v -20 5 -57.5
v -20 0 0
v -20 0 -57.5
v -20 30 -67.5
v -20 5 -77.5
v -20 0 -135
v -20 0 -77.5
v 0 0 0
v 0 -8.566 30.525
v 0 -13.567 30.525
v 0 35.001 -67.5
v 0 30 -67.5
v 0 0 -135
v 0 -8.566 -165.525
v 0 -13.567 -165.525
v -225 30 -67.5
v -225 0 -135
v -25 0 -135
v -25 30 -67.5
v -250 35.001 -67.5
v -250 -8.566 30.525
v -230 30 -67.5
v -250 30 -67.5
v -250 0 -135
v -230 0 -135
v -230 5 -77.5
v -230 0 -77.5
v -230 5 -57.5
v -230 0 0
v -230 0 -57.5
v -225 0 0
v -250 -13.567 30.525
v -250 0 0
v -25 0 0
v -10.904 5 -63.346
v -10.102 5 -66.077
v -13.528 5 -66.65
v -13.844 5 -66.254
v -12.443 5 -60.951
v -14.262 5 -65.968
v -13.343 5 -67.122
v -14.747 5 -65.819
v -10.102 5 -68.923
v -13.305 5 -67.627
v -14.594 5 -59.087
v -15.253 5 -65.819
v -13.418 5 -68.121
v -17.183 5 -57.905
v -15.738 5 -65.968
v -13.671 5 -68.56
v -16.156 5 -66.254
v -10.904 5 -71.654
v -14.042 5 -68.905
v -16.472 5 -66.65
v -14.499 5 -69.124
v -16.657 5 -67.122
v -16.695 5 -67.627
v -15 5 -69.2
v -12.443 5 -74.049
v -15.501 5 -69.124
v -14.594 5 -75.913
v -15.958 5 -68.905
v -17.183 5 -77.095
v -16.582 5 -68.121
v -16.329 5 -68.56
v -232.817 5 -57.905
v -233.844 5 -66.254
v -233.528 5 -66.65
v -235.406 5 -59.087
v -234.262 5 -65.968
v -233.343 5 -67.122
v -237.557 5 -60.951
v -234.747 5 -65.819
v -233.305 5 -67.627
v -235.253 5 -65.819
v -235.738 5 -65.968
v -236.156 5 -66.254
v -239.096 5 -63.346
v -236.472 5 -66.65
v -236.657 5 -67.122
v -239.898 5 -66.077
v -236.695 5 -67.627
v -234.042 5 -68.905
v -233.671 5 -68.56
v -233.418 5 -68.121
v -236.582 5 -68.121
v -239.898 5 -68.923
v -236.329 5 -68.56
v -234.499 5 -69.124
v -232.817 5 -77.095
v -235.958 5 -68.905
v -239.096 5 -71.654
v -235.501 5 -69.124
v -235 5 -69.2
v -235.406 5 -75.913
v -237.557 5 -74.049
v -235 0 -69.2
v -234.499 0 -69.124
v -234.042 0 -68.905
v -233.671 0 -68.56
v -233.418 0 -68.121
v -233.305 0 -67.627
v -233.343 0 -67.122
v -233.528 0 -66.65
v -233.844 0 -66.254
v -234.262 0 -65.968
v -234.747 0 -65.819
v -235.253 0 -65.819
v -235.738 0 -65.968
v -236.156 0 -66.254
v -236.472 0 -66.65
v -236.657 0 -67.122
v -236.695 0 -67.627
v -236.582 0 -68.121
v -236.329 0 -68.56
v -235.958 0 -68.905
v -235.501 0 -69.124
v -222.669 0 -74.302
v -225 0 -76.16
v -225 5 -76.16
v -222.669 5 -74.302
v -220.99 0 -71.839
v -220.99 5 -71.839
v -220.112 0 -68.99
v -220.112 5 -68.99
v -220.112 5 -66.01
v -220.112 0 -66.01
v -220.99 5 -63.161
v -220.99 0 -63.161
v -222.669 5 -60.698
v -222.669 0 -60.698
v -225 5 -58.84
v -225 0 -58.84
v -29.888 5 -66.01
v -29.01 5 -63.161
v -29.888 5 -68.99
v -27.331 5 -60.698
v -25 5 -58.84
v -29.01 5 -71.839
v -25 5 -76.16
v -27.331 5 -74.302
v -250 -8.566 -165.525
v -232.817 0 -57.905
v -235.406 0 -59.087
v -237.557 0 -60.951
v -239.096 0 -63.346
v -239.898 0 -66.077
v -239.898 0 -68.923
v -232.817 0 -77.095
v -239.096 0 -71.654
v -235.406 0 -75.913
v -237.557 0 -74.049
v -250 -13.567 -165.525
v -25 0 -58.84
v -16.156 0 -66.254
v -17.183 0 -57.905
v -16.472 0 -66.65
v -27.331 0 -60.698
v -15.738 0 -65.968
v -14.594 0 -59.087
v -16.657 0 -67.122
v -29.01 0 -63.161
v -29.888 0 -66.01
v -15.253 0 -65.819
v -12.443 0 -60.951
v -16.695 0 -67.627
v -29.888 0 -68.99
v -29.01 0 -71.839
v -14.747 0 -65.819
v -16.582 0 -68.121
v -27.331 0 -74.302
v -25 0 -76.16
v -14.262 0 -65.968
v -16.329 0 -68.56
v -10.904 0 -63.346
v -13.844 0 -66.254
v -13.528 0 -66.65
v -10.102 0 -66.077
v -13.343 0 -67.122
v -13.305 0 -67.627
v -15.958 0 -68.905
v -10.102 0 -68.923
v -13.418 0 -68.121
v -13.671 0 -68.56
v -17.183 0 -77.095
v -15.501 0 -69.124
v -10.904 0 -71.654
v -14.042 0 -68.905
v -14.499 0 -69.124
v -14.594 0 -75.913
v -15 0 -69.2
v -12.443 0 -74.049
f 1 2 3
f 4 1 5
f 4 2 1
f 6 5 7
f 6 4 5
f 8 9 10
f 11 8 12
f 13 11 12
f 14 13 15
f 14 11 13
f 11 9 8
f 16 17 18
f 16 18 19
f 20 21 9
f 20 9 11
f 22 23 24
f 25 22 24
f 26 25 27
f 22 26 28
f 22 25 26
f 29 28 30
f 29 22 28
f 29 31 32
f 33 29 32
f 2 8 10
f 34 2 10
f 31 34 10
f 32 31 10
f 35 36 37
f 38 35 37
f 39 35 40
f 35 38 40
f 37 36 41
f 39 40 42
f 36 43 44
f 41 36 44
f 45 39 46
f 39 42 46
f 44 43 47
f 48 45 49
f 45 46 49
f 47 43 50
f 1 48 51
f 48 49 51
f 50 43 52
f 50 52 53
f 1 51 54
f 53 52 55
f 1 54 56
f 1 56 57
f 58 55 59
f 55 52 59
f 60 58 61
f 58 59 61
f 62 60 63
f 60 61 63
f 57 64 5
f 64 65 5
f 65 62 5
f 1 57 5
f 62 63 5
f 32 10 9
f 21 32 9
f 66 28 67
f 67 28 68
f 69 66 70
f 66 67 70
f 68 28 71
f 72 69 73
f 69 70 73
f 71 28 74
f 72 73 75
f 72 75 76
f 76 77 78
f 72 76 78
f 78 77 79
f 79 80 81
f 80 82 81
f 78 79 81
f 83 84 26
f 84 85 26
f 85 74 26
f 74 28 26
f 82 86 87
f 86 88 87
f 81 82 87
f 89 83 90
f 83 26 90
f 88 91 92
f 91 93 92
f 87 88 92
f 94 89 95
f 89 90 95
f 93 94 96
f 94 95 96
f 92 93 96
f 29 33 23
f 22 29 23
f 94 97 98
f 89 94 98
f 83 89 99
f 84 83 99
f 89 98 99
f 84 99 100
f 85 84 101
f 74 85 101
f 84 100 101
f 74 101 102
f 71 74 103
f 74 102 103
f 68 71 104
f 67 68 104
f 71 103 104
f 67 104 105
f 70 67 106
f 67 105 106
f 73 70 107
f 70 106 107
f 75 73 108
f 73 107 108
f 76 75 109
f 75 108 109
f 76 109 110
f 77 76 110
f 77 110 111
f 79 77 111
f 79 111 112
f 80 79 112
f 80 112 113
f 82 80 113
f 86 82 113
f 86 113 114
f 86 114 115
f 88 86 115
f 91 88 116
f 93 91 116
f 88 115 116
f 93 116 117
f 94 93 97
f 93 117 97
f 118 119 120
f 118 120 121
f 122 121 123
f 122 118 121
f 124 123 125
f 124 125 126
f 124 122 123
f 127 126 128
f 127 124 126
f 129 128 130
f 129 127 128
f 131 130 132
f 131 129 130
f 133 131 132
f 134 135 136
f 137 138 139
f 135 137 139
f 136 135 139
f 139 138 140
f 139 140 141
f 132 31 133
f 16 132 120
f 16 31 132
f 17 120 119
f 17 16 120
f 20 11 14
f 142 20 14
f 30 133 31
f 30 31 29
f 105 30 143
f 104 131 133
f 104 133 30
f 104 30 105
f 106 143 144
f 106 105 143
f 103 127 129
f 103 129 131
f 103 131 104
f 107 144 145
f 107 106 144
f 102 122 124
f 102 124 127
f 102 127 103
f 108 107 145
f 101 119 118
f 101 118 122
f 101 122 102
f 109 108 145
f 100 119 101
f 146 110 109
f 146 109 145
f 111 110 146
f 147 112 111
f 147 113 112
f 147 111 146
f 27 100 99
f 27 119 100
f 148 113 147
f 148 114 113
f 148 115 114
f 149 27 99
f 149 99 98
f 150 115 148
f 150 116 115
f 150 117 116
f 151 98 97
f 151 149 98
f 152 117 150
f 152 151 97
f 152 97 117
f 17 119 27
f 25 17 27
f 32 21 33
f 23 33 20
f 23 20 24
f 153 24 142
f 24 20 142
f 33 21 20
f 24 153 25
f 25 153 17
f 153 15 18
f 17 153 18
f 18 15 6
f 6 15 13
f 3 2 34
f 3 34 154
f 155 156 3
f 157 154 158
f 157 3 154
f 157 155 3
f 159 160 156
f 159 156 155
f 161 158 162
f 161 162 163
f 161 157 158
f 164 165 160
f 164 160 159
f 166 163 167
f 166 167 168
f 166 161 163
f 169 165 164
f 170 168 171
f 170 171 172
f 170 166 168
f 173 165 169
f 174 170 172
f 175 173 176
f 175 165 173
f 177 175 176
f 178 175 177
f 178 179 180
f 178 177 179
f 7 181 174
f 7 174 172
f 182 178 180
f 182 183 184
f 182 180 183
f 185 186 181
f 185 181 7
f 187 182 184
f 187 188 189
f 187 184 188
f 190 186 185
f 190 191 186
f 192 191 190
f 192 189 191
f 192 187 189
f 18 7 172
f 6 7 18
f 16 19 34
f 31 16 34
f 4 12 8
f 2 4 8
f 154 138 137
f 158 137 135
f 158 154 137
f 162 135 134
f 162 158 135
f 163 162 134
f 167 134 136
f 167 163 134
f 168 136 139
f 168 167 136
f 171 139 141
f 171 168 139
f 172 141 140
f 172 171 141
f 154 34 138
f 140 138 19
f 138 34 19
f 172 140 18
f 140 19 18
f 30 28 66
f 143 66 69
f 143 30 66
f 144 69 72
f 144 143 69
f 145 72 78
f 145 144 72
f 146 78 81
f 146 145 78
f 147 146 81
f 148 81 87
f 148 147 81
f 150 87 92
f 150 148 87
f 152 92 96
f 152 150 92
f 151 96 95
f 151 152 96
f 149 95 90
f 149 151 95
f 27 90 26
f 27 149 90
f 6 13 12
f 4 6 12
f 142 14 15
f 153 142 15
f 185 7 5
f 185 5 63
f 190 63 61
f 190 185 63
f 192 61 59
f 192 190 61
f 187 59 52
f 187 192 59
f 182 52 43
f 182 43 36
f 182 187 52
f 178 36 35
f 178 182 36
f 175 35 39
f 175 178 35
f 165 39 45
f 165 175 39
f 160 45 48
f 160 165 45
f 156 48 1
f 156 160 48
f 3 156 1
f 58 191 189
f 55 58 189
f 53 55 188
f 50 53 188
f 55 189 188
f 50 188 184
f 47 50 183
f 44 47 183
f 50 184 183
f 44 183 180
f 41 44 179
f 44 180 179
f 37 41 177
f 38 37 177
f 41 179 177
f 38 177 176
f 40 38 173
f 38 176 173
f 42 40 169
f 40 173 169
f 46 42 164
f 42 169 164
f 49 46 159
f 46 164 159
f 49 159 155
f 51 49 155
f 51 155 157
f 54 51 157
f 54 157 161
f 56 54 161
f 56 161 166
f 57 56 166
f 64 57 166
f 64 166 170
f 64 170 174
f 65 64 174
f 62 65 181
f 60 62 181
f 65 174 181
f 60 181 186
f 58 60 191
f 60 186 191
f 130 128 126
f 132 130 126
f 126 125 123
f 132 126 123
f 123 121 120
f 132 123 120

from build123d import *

# Parameters (mm, degrees)
BOSS_EXTRUDE2_DEPTH = 250
BOSS_EXTRUDE3_DEPTH = 25
CUT_EXTRUDE1_DEPTH  = 20
BOSS_EXTRUDE4_DEPTH = 25
CUT_EXTRUDE2_DEPTH  = 20
SKETCH6_R           = 10
BOSS_EXTRUDE5_DEPTH = 5


with BuildPart() as part:
    # Sketch1 → Boss-Extrude2 (new body)
    with BuildSketch(Plane(origin=(0, 0, 0), x_dir=(0, 0, -1), z_dir=(1, 0, 0))):
        Polygon((-30.524745156, -13.566553403), (0, 0), (67.5, 30), (135, 0), (165.524745156, -13.566553403), (165.524745156, -8.565955709), (67.5, 35.000597694), (-30.524745156, -8.565955709), align=None)
    extrude(amount=-BOSS_EXTRUDE2_DEPTH)

    # Sketch2 → Boss-Extrude3 (add)
    with BuildSketch(Plane(origin=(0, 0, 0), x_dir=(0, 0, -1), z_dir=(1, 0, 0))):
        Polygon((0, 0), (135, 0), (67.5, 30), align=None)
    extrude(amount=-BOSS_EXTRUDE3_DEPTH)

    # Sketch3 → Cut-Extrude1 (cut)
    with BuildSketch(Plane(origin=(0, 0, 0), x_dir=(0, 0, -1), z_dir=(1, 0, 0))):
        Polygon((0, 0), (135, 0), (67.5, 30), align=None)
    extrude(amount=-CUT_EXTRUDE1_DEPTH, mode=Mode.SUBTRACT)

    # Sketch4 → Boss-Extrude4 (add)
    with BuildSketch(Plane.ZY.offset(250)):
        Polygon((0, 0), (-135, 0), (-67.5, 30), align=None)
    extrude(amount=-BOSS_EXTRUDE4_DEPTH)

    # Sketch5 → Cut-Extrude2 (cut)
    with BuildSketch(Plane.ZY.offset(250)):
        Polygon((-135, 0), (0, 0), (-67.5, 30), align=None)
    extrude(amount=-CUT_EXTRUDE2_DEPTH, mode=Mode.SUBTRACT)

    # Sketch6 → Boss-Extrude5 (add)
    # profile 1 of 2: a face of its own
    with BuildSketch(Plane(origin=(0, 0, 0), x_dir=(-1, 0, 0), z_dir=(0, -1, 0))):
        with Locations((230, 67.5)):
            Circle(SKETCH6_R)
        with BuildLine():
            ThreePointArc((233.3, 67.5), (235, 69.2), (236.7, 67.5))
            ThreePointArc((236.7, 67.5), (235, 65.8), (233.3, 67.5))
        make_face(mode=Mode.SUBTRACT)
    # profile 2 of 2: a face of its own
    with BuildSketch(Plane(origin=(0, 0, 0), x_dir=(-1, 0, 0), z_dir=(0, -1, 0))):
        with Locations((20, 67.5)):
            Circle(SKETCH6_R)
        with BuildLine():
            ThreePointArc((13.3, 67.5), (15, 69.2), (16.7, 67.5))
            ThreePointArc((16.7, 67.5), (15, 65.8), (13.3, 67.5))
        make_face(mode=Mode.SUBTRACT)
    extrude(amount=-BOSS_EXTRUDE5_DEPTH)


solid = part.part
